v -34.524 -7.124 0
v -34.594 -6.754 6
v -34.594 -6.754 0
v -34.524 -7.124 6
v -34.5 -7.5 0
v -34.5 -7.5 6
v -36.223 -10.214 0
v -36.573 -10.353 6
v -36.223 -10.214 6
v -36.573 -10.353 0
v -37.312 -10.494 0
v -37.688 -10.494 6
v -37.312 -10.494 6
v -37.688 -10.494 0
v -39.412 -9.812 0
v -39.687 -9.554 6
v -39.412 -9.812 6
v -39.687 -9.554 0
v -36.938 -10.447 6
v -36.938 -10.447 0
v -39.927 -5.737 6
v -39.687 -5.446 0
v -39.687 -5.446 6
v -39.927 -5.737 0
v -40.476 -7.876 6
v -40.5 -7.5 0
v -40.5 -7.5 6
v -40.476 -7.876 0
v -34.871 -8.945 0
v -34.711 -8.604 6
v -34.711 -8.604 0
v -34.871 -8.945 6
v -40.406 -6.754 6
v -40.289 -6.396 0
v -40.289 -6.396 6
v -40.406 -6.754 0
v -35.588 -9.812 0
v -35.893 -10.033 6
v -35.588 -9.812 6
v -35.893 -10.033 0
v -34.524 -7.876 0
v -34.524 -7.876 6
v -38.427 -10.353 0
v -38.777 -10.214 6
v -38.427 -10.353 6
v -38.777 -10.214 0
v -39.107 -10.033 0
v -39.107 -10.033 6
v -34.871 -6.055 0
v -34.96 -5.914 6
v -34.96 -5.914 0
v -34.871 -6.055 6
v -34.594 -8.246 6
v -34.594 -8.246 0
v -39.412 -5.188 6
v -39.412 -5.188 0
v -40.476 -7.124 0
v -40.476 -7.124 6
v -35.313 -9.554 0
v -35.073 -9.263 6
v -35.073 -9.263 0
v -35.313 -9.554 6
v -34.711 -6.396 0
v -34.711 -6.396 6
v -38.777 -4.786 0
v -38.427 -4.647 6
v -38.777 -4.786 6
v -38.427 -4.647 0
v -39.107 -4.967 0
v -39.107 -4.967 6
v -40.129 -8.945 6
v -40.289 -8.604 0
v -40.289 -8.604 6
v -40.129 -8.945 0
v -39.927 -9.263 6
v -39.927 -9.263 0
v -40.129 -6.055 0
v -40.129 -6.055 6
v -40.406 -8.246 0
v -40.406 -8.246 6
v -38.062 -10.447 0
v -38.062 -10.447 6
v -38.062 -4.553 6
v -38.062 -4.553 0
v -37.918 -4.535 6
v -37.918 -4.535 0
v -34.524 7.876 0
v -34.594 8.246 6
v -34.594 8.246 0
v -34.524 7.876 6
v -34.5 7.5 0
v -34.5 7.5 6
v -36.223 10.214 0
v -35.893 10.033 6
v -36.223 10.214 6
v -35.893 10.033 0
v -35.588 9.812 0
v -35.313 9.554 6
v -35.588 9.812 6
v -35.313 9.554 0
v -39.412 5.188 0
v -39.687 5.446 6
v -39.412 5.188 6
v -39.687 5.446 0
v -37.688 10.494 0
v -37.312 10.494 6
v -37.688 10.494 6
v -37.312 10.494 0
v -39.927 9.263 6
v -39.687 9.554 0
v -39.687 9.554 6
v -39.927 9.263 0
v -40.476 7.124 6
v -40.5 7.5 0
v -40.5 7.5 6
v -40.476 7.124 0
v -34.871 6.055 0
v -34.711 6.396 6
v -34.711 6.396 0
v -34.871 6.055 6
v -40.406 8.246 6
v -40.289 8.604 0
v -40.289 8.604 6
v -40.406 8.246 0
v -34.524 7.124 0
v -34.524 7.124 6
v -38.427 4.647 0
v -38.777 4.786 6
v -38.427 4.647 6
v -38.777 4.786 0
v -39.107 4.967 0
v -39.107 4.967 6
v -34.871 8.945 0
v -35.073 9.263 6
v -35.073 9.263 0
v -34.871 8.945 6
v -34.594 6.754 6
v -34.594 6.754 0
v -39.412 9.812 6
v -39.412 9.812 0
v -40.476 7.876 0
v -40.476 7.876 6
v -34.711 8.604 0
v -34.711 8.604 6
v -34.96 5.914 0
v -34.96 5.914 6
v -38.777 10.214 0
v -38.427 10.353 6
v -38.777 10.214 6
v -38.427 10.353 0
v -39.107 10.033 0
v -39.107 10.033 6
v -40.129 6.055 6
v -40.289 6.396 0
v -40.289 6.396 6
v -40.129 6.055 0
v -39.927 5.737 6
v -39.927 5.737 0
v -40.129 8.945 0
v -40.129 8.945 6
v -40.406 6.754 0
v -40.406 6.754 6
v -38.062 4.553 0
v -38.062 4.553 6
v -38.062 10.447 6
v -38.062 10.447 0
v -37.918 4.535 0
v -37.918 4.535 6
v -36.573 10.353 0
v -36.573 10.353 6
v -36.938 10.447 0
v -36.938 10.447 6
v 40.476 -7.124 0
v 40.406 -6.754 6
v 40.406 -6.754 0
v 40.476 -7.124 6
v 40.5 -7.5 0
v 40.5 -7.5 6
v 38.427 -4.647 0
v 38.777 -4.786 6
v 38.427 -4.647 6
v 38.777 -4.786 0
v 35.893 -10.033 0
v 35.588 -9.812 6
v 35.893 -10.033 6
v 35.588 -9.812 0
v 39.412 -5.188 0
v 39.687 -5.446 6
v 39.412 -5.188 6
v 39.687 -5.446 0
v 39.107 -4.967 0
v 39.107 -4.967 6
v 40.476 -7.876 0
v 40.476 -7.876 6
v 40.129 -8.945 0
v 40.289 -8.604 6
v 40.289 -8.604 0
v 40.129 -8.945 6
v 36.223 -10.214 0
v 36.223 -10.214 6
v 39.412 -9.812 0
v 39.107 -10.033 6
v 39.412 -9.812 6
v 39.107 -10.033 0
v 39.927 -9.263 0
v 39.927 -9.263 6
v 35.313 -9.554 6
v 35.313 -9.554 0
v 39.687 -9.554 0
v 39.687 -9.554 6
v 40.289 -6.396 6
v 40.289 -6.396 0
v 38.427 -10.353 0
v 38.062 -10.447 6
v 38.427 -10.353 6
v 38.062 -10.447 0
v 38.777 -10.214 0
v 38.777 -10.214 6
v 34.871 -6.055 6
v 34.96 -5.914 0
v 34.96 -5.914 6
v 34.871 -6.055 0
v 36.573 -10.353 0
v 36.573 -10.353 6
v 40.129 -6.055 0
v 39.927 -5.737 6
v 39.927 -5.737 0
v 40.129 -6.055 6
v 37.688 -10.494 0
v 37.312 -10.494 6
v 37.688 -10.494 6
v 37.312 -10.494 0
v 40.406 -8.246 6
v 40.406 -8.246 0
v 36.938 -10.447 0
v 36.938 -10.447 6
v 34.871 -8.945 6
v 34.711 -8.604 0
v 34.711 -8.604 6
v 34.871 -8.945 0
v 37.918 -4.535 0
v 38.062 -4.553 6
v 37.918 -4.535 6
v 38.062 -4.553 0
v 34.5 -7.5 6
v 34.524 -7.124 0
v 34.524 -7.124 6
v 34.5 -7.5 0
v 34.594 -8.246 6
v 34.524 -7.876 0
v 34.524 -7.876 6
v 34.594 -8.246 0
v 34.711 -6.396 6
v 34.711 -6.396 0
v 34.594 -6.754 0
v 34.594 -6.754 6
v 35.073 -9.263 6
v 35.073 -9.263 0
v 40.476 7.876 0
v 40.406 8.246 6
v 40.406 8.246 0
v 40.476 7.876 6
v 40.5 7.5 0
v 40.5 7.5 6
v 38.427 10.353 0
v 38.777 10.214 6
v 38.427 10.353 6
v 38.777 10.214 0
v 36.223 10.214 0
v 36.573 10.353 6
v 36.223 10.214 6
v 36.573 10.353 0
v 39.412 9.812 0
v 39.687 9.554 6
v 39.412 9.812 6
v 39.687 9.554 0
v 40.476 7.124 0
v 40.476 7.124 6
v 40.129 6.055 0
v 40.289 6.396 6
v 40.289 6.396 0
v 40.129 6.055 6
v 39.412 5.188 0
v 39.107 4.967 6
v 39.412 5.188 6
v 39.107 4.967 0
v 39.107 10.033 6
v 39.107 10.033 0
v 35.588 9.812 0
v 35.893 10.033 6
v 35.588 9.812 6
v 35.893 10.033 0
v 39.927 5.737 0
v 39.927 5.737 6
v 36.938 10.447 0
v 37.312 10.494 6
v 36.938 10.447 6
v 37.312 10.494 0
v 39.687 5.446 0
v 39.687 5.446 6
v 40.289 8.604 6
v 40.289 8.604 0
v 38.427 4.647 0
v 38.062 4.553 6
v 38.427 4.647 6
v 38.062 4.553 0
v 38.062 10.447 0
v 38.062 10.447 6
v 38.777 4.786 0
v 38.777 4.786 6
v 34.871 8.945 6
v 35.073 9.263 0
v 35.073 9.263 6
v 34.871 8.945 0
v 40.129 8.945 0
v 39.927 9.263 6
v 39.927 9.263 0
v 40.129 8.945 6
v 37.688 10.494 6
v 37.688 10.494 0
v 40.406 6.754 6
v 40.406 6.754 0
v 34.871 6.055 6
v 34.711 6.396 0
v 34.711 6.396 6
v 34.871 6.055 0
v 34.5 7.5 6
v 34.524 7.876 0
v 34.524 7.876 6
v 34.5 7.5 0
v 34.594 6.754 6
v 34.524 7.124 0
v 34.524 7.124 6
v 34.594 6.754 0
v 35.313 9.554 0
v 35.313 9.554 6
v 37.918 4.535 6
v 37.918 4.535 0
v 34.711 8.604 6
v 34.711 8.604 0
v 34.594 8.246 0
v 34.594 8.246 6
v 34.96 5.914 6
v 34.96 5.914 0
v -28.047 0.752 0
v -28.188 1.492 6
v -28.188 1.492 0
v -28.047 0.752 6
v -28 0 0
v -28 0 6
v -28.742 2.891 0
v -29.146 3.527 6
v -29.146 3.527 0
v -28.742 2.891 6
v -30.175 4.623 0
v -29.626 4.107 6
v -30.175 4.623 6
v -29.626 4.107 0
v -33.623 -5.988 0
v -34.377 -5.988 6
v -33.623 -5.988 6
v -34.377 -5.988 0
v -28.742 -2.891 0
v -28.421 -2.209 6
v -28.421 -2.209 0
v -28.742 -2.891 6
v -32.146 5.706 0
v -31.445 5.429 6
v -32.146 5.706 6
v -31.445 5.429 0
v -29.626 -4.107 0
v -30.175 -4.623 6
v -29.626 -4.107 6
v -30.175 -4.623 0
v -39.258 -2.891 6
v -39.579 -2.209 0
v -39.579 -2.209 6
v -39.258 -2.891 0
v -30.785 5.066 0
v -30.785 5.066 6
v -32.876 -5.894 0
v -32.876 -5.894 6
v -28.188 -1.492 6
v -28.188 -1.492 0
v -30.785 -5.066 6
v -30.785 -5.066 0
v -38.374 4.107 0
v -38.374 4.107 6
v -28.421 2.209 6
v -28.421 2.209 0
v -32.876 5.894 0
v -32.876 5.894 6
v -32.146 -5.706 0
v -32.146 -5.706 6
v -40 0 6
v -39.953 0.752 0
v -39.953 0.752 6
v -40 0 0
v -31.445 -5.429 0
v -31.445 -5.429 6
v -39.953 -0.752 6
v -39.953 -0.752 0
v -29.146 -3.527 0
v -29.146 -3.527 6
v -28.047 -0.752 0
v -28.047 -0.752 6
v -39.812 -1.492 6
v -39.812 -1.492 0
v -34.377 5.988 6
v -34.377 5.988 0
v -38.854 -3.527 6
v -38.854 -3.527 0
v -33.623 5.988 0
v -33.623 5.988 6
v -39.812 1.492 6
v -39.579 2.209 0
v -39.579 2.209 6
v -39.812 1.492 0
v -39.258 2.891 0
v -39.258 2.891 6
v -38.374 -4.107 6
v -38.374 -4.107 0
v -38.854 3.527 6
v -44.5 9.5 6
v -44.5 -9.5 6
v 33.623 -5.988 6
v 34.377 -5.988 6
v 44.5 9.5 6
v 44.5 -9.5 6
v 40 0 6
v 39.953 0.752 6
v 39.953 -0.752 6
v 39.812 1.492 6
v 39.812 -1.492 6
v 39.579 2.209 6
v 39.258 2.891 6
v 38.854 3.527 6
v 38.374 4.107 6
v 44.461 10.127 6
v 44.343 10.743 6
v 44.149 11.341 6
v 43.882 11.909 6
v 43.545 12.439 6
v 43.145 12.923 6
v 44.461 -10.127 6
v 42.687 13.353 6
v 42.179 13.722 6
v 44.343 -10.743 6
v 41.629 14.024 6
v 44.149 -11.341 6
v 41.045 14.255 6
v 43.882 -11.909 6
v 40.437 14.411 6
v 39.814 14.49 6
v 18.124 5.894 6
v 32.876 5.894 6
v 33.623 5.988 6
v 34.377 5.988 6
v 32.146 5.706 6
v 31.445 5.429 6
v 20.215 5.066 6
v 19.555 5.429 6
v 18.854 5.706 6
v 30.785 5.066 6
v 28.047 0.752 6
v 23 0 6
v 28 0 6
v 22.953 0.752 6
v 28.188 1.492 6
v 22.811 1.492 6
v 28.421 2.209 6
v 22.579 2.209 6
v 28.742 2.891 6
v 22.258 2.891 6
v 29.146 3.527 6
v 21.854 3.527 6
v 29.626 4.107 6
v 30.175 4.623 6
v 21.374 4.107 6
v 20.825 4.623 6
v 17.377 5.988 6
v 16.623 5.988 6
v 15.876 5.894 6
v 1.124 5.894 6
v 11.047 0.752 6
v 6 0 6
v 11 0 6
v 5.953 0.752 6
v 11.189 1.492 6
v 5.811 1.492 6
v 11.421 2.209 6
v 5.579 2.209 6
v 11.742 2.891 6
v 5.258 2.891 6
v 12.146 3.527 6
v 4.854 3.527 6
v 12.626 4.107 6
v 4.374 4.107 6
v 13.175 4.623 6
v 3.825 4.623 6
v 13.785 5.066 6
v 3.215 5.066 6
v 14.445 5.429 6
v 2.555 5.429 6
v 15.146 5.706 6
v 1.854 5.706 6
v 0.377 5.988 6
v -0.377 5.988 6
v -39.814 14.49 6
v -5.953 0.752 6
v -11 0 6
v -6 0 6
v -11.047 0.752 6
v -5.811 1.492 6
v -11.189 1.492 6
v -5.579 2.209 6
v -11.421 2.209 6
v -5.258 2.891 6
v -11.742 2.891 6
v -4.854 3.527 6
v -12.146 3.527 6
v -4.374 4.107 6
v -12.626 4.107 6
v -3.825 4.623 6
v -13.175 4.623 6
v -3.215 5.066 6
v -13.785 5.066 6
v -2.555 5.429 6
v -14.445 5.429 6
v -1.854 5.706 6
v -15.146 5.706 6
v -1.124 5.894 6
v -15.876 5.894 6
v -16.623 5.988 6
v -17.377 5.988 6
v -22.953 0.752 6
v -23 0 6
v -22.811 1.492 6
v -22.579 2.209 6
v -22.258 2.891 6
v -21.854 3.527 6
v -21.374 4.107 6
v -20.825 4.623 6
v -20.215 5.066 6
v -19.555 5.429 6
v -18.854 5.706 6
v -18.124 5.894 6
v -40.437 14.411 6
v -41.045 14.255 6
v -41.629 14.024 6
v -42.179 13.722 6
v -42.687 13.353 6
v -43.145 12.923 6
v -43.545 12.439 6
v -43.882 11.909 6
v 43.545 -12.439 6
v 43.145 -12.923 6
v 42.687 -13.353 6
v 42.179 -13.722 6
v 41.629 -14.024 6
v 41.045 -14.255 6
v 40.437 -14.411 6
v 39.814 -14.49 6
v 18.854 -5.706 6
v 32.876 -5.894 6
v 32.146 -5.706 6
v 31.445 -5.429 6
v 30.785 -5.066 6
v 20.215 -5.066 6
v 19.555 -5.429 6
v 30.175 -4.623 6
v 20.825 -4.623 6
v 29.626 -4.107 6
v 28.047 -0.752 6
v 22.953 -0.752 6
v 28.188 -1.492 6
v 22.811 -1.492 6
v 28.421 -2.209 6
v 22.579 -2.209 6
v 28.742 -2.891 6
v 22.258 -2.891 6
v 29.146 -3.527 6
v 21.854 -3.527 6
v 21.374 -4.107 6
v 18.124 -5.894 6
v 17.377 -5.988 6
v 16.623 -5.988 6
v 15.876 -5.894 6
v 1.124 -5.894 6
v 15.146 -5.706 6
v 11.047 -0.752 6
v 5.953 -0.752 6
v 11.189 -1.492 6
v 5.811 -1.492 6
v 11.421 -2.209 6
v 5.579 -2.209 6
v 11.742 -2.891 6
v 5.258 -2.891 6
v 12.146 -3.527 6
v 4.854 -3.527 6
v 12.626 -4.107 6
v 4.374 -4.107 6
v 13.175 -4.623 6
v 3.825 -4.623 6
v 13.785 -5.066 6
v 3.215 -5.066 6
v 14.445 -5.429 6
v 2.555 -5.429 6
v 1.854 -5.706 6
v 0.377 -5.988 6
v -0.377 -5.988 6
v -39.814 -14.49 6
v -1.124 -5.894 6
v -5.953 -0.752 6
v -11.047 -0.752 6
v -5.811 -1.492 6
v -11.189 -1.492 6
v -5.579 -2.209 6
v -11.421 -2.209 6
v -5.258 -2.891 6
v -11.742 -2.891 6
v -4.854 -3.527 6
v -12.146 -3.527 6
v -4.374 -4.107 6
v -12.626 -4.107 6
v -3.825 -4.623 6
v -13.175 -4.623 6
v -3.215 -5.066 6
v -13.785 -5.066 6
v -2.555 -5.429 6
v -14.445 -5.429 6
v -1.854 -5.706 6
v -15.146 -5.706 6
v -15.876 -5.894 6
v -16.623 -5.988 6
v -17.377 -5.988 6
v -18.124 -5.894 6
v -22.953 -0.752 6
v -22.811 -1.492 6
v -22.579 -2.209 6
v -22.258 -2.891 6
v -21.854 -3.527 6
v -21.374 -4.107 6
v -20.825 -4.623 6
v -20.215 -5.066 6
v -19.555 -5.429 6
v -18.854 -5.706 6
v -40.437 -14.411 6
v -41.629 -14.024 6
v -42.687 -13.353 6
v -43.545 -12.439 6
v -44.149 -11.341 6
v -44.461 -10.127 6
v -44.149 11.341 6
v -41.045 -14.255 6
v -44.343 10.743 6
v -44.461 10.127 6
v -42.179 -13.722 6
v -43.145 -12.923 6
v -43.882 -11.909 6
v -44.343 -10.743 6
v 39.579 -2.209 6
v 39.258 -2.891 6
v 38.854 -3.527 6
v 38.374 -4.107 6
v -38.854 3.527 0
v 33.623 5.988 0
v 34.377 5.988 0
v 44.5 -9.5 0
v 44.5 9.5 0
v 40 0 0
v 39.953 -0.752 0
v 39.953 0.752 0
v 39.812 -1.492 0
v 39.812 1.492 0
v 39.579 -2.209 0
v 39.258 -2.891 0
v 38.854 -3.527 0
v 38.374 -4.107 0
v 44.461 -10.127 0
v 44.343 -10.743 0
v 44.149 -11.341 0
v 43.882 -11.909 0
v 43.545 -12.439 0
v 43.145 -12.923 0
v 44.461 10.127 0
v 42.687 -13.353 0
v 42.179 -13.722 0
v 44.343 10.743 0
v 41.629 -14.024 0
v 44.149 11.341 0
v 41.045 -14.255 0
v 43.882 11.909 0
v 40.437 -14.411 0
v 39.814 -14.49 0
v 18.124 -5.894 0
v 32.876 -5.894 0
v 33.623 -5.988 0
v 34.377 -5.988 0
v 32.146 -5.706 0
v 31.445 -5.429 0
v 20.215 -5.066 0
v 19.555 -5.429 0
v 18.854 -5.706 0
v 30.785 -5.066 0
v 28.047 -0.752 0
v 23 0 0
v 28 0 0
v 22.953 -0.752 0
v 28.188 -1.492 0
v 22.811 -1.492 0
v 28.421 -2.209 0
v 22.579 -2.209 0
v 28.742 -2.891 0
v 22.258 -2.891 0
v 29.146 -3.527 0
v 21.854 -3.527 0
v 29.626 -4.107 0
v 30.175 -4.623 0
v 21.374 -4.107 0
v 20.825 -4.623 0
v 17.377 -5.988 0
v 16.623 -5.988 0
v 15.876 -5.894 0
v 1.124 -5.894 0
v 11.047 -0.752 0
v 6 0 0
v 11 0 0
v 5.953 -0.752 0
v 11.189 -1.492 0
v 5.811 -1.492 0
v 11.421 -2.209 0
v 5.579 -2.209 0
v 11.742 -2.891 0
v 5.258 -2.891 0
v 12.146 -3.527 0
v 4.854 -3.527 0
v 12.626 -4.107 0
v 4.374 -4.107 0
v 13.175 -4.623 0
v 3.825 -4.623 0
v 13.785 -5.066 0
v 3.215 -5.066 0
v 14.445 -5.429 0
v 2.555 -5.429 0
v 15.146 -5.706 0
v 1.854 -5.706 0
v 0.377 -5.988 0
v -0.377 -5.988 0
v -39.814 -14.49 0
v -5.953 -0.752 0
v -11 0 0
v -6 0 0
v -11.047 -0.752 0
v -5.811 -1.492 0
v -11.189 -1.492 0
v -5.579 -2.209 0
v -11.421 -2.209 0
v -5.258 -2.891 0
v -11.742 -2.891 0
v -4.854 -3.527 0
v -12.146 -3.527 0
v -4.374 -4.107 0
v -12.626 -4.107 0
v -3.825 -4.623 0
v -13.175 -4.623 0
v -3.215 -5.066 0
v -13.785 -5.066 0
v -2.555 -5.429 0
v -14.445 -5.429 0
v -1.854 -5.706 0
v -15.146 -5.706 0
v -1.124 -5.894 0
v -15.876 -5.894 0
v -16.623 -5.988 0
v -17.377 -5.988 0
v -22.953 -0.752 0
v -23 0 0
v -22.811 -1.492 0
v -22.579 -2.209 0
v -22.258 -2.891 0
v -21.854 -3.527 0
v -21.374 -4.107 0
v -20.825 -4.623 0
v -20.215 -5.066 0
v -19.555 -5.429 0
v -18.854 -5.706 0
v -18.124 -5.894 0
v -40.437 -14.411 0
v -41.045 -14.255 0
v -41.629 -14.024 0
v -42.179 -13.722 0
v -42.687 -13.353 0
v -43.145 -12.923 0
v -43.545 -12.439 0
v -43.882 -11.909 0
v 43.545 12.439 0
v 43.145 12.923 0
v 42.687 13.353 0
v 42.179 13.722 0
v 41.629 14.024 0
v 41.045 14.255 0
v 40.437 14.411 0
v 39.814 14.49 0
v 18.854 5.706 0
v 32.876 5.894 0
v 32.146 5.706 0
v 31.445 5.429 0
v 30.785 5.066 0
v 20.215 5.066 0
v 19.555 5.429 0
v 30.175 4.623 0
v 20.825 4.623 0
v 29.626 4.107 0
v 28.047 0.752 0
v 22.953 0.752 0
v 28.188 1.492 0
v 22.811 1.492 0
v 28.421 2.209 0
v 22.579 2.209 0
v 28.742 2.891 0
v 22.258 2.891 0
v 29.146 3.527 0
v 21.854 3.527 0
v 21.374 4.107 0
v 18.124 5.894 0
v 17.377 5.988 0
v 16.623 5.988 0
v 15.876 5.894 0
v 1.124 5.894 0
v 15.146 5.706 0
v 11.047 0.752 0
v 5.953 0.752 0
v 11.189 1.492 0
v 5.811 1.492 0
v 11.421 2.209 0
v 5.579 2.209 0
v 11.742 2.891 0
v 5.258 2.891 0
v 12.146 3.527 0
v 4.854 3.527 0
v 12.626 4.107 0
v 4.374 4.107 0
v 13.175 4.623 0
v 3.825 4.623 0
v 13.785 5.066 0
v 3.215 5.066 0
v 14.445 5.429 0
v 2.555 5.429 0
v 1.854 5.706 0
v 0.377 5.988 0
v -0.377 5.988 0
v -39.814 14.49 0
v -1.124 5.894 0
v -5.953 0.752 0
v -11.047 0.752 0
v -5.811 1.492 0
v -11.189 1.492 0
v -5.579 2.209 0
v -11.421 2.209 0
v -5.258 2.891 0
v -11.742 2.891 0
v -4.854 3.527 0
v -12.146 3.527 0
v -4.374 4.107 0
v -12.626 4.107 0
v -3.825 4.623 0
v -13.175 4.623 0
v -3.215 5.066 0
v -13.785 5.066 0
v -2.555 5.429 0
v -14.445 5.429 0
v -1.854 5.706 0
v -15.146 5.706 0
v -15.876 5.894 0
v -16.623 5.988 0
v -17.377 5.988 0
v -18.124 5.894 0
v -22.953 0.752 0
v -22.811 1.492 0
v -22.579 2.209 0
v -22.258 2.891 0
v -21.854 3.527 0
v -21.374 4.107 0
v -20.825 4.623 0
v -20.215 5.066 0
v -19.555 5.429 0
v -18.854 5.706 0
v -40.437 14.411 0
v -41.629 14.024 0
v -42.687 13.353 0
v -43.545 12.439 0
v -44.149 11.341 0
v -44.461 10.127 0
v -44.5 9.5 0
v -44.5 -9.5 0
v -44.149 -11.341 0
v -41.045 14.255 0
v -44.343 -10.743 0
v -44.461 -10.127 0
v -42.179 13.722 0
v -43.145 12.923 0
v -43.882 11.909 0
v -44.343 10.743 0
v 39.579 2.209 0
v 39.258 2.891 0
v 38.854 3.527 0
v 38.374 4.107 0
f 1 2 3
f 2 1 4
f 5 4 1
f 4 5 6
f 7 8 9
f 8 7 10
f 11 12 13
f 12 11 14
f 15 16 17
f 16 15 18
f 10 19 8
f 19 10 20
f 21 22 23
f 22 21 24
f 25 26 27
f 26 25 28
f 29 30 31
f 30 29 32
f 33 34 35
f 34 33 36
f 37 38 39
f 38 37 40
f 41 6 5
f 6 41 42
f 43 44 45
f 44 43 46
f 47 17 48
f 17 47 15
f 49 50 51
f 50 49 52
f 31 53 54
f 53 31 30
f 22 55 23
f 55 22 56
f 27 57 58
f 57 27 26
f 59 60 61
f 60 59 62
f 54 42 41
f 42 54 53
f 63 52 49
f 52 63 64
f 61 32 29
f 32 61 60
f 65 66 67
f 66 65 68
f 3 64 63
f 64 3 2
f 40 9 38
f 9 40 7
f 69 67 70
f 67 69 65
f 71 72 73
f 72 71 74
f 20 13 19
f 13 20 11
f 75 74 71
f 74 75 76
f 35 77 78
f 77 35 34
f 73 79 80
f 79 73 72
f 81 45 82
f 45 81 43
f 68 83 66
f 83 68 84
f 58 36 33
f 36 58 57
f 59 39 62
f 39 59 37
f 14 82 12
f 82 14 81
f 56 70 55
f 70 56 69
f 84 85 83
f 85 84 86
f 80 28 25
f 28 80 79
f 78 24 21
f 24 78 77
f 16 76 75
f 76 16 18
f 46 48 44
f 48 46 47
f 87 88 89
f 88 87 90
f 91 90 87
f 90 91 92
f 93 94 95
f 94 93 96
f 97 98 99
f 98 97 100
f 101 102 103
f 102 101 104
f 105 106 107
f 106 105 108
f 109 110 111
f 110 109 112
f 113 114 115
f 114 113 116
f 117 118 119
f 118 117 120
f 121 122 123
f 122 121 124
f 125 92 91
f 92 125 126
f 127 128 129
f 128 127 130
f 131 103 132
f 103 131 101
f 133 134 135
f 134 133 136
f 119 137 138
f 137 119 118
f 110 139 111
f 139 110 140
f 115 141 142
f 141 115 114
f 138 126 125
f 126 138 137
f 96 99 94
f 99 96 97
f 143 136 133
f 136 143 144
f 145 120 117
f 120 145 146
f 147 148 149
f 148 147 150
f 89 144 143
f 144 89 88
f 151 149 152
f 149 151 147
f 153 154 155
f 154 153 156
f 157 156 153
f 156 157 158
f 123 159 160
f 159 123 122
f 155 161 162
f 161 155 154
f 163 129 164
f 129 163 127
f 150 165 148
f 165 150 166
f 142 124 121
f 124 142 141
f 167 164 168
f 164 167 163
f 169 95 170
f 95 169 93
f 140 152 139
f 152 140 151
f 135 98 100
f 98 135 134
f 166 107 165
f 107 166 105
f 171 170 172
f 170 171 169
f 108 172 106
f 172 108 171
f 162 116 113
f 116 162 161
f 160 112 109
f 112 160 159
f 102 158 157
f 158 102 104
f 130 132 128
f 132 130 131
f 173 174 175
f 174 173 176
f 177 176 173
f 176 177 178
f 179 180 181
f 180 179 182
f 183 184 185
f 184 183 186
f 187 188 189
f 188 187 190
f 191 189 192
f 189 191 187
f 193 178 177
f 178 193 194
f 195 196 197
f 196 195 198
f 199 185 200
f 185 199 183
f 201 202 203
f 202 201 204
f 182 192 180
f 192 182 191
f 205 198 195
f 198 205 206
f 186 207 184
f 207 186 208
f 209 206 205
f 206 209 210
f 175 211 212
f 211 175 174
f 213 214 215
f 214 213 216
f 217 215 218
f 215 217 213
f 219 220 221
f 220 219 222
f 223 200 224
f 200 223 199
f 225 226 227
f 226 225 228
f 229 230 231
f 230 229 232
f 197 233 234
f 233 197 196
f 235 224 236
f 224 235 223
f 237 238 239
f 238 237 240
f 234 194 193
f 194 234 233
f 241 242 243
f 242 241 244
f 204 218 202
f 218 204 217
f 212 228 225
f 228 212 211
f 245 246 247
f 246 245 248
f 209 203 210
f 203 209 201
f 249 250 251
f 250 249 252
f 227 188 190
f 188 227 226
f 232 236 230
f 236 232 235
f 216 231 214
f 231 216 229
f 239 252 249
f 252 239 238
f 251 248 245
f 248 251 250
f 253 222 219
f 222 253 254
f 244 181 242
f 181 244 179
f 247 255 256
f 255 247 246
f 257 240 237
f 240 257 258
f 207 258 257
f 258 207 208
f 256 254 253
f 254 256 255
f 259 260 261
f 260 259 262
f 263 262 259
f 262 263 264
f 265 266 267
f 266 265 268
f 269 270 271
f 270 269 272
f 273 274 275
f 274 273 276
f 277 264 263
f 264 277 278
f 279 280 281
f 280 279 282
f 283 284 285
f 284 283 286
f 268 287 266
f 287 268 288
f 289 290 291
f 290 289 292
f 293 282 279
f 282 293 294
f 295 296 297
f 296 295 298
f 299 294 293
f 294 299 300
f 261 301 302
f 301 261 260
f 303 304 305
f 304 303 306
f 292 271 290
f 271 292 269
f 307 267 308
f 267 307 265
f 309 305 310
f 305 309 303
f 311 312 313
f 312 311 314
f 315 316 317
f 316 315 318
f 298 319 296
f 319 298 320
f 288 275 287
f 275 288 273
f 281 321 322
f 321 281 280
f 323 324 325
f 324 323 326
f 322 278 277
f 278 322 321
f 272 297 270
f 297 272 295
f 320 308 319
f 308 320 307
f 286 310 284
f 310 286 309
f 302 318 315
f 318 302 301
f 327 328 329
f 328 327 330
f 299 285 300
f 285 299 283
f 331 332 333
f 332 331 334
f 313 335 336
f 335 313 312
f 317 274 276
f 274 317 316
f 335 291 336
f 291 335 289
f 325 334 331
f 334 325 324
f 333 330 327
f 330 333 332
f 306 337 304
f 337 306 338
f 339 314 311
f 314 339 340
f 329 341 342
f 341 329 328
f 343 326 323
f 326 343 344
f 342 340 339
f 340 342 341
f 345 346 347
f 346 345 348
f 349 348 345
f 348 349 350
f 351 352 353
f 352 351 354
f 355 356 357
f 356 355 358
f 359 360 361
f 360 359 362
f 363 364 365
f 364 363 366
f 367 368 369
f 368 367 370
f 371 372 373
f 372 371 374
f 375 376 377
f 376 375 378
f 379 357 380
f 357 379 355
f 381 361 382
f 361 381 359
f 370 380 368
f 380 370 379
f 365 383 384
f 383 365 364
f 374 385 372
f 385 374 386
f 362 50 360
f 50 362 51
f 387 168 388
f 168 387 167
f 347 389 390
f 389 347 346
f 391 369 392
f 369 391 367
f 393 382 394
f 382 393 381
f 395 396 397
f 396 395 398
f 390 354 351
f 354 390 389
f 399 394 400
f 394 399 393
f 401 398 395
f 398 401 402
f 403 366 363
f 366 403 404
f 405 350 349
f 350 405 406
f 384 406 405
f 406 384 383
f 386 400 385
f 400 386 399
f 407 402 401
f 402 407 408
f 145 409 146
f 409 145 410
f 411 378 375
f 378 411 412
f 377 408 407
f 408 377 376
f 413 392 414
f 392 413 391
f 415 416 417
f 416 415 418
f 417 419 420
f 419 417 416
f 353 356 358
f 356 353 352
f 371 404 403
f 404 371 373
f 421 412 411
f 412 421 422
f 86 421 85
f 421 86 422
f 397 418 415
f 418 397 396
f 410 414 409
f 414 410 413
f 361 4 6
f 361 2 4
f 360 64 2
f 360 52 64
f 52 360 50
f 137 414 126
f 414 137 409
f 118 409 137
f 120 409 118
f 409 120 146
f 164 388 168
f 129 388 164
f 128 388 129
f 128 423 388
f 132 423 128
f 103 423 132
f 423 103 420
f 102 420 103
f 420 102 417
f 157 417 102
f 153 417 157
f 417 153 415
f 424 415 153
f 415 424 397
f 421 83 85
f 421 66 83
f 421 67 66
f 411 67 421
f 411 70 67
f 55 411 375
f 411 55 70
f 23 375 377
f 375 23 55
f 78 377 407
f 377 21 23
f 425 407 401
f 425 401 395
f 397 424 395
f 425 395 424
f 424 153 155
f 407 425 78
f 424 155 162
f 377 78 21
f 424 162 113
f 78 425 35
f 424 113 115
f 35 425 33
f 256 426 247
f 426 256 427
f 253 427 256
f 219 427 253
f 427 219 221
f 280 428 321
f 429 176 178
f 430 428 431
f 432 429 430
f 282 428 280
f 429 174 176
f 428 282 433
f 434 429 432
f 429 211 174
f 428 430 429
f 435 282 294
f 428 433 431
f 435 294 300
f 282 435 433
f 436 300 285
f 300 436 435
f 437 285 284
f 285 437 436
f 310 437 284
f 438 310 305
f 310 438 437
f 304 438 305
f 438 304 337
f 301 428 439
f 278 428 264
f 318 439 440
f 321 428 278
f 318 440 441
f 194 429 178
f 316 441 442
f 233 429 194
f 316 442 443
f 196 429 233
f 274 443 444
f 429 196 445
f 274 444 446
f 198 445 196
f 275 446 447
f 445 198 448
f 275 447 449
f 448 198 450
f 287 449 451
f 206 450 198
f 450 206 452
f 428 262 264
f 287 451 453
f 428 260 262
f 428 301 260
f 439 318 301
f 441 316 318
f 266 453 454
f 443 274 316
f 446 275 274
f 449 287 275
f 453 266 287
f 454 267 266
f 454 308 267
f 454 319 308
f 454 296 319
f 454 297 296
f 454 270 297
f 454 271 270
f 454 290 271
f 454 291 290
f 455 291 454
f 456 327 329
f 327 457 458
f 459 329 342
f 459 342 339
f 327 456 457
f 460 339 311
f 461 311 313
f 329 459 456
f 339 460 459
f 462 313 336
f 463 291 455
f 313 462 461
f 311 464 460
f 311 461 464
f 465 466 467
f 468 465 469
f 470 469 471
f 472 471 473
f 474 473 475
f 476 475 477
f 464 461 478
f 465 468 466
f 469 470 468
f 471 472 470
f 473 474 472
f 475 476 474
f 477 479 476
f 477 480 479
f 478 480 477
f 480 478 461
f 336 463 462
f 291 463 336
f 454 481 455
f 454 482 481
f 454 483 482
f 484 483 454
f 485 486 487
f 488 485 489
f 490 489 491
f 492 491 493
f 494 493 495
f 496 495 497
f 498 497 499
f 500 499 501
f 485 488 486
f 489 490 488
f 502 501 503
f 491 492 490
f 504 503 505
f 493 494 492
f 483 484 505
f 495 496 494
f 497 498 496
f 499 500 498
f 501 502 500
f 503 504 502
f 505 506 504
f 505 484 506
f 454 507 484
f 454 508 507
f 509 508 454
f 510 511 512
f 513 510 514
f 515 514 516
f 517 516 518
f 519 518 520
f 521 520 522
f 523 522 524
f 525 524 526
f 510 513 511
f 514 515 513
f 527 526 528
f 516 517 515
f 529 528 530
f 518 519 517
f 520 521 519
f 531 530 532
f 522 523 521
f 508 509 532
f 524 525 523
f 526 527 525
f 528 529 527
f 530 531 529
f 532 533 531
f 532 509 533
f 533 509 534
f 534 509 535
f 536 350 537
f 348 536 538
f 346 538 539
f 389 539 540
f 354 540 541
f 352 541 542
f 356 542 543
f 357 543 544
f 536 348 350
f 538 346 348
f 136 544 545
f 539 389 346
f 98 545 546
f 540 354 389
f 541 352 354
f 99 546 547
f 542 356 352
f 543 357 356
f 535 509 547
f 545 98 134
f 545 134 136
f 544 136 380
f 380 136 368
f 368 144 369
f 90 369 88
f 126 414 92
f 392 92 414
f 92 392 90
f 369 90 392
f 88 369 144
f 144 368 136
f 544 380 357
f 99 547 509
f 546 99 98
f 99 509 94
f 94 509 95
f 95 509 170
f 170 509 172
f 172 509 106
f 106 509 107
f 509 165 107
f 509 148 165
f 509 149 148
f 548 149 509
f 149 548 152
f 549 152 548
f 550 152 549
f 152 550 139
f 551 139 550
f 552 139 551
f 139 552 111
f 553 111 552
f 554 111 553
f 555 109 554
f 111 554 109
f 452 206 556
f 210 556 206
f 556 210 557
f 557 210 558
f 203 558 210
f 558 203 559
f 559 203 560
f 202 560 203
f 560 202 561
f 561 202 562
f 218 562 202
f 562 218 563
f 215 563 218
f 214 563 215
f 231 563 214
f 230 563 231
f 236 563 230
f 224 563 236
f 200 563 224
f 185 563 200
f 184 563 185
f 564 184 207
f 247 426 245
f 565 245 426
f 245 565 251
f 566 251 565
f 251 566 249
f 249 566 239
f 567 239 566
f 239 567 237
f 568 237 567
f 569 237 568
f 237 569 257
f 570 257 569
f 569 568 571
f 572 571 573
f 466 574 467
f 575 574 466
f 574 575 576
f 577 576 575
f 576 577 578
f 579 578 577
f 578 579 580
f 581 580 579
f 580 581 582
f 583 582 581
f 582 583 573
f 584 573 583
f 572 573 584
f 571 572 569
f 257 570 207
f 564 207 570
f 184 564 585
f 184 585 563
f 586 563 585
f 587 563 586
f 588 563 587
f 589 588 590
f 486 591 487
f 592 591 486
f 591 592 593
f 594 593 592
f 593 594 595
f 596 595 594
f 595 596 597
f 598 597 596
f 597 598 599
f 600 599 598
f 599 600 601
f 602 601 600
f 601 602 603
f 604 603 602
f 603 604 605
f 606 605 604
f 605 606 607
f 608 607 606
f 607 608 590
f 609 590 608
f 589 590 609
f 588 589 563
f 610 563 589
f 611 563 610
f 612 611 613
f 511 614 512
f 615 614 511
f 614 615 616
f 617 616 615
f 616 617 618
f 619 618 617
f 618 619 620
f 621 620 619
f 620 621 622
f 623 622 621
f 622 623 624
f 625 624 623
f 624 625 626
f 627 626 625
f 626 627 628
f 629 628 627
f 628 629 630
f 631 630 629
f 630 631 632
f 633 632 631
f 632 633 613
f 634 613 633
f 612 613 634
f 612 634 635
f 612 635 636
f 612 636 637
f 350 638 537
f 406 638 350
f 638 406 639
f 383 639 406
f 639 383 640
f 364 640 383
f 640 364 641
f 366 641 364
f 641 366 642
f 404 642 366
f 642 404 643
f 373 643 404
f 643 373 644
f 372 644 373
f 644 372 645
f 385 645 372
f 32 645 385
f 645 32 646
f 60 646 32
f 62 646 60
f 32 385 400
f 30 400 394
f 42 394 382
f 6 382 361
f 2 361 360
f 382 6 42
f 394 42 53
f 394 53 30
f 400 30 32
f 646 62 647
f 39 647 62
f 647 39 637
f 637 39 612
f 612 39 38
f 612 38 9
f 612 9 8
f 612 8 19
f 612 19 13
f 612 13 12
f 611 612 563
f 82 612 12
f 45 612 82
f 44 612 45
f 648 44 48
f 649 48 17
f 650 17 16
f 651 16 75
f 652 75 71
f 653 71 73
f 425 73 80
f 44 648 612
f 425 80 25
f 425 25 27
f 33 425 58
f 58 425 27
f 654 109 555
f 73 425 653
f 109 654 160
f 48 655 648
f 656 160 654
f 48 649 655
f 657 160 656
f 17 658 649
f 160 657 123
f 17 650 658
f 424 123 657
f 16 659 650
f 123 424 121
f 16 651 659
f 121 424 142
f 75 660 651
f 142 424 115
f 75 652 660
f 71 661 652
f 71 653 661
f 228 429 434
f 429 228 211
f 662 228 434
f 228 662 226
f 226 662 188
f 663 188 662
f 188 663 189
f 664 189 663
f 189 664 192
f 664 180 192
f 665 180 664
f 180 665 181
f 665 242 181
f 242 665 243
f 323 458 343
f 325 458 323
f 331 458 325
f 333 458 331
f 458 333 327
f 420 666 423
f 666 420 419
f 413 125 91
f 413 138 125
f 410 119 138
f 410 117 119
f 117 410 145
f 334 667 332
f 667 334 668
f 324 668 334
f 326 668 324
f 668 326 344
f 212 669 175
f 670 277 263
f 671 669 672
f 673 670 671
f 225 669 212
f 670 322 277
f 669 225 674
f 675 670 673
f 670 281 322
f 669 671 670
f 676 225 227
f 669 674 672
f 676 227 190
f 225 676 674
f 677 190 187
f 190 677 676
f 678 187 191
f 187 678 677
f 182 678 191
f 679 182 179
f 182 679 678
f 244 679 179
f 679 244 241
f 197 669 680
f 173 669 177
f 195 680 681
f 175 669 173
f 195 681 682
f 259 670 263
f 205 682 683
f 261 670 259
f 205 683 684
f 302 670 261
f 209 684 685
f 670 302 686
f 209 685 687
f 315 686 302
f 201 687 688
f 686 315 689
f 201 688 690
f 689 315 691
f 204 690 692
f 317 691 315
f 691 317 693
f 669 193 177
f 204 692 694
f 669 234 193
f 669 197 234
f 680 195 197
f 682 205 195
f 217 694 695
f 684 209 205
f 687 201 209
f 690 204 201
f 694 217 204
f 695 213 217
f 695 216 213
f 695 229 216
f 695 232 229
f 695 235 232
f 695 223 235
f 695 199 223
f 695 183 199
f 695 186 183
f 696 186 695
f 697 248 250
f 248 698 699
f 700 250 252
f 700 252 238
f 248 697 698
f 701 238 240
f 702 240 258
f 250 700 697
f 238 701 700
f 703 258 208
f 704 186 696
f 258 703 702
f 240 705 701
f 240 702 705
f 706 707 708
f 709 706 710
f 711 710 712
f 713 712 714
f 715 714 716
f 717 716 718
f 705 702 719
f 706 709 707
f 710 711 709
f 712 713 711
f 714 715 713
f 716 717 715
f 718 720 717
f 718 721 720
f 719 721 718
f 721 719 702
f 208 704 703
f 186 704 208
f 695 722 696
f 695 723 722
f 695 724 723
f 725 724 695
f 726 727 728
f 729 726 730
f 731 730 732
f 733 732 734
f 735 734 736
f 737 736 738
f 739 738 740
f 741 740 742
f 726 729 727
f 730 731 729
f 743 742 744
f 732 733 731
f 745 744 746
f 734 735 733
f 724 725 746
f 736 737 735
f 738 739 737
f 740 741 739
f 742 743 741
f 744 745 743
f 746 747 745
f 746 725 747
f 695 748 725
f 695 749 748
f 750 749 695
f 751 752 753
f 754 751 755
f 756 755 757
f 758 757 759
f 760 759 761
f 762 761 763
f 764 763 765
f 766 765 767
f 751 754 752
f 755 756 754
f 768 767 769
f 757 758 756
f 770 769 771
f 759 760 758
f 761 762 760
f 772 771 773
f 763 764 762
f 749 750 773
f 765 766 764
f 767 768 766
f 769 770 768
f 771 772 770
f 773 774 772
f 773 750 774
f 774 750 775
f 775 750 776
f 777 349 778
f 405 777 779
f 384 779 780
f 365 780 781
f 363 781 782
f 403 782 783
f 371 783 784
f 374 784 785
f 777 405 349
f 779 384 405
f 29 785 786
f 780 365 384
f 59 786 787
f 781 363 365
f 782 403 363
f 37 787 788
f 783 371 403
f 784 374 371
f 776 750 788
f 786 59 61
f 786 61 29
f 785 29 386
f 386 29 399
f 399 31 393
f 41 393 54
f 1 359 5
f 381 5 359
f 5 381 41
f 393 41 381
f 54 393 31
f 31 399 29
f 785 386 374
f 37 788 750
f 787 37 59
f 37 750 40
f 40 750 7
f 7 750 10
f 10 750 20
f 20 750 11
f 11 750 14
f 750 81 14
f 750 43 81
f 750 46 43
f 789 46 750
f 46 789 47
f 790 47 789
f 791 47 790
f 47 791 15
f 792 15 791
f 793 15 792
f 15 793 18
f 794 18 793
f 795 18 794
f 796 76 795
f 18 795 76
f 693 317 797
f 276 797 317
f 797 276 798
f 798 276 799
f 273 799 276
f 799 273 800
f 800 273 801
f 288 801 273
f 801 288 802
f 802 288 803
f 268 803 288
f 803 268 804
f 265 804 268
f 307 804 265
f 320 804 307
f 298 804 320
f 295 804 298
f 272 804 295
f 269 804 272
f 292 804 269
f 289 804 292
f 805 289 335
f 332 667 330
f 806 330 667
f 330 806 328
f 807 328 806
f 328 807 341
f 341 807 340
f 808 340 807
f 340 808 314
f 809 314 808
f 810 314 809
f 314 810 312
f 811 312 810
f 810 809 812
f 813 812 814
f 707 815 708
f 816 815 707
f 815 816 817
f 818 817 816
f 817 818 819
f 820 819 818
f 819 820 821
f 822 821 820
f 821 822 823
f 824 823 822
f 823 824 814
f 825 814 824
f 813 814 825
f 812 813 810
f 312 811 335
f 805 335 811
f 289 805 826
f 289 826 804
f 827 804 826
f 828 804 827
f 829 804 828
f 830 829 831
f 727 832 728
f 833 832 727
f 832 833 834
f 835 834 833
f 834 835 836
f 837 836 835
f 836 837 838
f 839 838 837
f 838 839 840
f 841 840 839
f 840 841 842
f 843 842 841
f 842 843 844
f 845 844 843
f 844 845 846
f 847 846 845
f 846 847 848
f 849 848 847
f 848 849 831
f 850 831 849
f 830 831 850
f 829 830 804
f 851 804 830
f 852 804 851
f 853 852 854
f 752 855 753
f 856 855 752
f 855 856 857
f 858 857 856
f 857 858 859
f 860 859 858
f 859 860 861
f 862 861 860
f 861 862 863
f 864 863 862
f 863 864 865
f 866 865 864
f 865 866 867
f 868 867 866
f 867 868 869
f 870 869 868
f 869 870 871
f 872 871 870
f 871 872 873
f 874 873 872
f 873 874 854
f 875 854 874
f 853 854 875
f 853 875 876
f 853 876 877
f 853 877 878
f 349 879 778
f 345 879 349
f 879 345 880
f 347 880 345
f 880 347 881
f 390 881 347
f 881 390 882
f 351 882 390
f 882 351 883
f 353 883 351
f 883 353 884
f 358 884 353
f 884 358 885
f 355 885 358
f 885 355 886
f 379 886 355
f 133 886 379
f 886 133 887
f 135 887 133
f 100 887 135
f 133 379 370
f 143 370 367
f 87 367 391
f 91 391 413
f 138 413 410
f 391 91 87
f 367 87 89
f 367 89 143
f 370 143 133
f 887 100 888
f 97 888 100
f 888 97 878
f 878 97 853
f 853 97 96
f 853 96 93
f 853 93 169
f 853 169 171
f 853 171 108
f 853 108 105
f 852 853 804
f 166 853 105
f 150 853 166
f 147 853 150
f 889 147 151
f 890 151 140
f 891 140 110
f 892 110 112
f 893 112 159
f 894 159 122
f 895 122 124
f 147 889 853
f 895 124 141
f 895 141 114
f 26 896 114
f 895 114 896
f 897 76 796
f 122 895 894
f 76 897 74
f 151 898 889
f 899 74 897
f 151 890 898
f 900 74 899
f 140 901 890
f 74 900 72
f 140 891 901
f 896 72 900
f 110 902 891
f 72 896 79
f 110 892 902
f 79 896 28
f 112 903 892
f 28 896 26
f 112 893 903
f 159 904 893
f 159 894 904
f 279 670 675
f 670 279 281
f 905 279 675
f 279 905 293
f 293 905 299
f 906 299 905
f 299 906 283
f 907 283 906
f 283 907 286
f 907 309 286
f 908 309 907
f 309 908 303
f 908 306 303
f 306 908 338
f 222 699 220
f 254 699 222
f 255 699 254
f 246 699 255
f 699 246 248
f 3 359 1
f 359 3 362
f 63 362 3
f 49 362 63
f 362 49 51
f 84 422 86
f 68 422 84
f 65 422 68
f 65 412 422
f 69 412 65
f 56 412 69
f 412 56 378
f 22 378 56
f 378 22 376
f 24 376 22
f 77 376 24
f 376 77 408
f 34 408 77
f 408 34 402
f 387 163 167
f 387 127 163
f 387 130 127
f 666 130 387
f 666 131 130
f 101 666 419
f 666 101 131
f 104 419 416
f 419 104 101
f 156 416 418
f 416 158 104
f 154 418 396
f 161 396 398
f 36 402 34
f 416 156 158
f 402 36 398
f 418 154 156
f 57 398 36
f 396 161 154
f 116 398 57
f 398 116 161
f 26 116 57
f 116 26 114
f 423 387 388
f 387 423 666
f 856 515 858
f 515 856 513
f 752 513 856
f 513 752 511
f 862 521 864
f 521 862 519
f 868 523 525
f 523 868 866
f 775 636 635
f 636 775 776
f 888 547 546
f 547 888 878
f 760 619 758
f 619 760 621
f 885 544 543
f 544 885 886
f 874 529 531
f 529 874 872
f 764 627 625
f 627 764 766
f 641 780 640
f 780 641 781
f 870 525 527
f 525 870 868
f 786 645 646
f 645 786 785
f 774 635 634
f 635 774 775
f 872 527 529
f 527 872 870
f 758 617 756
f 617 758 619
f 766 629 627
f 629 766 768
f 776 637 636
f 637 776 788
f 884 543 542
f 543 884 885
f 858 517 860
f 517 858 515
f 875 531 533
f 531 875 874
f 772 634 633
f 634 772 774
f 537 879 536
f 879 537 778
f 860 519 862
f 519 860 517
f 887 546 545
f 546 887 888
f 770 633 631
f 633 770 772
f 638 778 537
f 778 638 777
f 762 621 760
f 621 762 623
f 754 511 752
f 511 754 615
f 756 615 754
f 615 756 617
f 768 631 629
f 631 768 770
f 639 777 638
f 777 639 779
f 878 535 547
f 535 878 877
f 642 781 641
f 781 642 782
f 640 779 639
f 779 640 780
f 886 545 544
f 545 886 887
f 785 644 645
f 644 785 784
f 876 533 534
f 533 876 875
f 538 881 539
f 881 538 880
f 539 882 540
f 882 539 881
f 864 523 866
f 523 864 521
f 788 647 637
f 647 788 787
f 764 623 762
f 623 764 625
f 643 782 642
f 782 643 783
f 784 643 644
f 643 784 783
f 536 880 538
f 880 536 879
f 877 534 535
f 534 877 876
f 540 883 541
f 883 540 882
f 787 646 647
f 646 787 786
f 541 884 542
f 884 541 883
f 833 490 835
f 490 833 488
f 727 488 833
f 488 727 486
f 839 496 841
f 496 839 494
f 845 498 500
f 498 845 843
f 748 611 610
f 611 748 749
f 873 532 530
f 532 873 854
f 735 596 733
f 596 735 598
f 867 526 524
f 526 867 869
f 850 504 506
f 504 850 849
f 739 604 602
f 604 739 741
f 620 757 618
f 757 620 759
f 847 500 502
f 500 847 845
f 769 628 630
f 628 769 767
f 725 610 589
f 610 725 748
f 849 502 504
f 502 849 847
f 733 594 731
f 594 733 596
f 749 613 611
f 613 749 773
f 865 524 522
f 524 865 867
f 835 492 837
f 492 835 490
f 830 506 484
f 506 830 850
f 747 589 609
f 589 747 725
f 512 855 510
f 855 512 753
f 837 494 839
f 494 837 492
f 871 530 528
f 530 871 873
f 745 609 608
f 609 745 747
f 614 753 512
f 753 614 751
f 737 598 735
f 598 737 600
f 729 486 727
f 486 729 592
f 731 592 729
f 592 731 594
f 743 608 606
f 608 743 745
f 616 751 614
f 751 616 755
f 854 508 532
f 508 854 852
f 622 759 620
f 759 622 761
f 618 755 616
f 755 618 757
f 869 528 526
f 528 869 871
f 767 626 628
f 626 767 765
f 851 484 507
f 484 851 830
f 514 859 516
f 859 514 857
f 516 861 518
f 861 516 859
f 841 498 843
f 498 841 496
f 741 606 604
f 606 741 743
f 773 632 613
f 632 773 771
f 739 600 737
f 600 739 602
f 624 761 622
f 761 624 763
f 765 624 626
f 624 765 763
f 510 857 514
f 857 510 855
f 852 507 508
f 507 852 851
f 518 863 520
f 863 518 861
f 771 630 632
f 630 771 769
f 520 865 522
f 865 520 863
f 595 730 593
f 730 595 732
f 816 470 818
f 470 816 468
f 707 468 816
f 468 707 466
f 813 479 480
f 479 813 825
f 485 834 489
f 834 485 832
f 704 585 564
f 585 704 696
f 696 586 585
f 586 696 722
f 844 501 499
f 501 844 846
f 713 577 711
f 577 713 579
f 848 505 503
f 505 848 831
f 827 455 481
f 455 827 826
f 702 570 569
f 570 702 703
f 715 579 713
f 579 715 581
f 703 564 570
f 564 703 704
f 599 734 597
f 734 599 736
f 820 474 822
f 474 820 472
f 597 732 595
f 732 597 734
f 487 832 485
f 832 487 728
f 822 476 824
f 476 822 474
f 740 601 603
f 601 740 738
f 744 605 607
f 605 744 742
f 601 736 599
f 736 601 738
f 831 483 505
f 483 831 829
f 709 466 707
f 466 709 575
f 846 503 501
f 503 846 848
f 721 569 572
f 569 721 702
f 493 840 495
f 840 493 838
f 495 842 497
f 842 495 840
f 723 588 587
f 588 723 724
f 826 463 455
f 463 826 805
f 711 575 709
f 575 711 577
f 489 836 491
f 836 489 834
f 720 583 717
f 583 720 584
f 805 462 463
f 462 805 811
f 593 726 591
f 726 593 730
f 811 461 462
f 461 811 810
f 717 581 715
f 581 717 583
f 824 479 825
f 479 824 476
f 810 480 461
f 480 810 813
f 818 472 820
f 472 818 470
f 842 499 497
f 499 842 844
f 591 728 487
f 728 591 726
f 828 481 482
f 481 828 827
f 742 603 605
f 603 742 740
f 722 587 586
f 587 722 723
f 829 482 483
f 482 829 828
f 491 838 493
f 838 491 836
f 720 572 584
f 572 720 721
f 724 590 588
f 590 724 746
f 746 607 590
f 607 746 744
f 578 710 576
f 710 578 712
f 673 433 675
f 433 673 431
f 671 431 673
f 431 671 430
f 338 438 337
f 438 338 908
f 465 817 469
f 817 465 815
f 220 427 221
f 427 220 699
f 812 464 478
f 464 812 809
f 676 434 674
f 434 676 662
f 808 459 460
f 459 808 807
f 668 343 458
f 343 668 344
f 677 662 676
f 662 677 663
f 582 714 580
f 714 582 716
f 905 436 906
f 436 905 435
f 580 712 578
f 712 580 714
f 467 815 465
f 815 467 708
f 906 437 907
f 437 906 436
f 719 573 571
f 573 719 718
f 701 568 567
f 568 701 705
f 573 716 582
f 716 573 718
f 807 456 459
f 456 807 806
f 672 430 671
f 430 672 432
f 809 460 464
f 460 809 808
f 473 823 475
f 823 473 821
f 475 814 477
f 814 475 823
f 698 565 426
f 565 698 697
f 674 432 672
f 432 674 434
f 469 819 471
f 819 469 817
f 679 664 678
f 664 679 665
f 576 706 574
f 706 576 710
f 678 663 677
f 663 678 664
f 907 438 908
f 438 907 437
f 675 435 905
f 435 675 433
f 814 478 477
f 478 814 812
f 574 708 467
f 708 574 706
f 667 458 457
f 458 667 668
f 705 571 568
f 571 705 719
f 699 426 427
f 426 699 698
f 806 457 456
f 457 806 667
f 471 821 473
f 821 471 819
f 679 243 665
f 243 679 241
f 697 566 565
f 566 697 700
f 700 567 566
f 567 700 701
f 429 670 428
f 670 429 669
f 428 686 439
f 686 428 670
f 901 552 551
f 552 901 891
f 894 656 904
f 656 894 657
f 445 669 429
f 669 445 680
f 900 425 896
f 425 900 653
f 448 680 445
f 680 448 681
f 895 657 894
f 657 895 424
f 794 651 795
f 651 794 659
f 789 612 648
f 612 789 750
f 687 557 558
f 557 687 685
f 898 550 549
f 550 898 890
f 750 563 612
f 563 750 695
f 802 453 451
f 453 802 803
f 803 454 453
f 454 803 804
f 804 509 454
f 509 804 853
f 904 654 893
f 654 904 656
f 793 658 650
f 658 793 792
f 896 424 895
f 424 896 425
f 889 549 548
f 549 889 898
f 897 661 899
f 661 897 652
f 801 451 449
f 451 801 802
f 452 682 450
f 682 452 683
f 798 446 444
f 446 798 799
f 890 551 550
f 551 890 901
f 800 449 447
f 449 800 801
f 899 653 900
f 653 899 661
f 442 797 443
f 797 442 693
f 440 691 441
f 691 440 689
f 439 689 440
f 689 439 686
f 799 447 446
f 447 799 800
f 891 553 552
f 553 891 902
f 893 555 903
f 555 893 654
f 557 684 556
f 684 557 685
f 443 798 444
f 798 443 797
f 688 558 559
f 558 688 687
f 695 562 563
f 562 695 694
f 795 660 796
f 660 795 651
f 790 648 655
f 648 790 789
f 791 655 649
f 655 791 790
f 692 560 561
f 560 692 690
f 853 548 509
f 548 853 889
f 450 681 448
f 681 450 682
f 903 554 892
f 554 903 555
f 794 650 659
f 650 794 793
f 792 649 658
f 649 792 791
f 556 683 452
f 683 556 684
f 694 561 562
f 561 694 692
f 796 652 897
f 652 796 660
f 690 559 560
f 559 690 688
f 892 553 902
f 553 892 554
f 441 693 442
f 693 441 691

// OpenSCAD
$fn = 50;


difference() {
	union() {
		hull() {
			translate(v = [-39.5000000000, 9.5000000000, 0]) {
				cylinder(h = 6, r = 5);
			}
			translate(v = [39.5000000000, 9.5000000000, 0]) {
				cylinder(h = 6, r = 5);
			}
			translate(v = [-39.5000000000, -9.5000000000, 0]) {
				cylinder(h = 6, r = 5);
			}
			translate(v = [39.5000000000, -9.5000000000, 0]) {
				cylinder(h = 6, r = 5);
			}
		}
	}
	union() {
		#translate(v = [-37.5000000000, -7.5000000000, -100.0000000000]) {
			cylinder(h = 200, r = 3.0000000000);
		}
		#translate(v = [-37.5000000000, 7.5000000000, -100.0000000000]) {
			cylinder(h = 200, r = 3.0000000000);
		}
		#translate(v = [37.5000000000, -7.5000000000, -100.0000000000]) {
			cylinder(h = 200, r = 3.0000000000);
		}
		#translate(v = [37.5000000000, 7.5000000000, -100.0000000000]) {
			cylinder(h = 200, r = 3.0000000000);
		}
		#translate(v = [-34.0000000000, 0, 0]) {
			cylinder(h = 6, r = 6.0000000000);
		}
		#translate(v = [-17.0000000000, 0, 0]) {
			cylinder(h = 6, r = 6.0000000000);
		}
		#cylinder(h = 6, r = 6.0000000000);
		#translate(v = [17.0000000000, 0, 0]) {
			cylinder(h = 6, r = 6.0000000000);
		}
		#translate(v = [34.0000000000, 0, 0]) {
			cylinder(h = 6, r = 6.0000000000);
		}
	}
}
